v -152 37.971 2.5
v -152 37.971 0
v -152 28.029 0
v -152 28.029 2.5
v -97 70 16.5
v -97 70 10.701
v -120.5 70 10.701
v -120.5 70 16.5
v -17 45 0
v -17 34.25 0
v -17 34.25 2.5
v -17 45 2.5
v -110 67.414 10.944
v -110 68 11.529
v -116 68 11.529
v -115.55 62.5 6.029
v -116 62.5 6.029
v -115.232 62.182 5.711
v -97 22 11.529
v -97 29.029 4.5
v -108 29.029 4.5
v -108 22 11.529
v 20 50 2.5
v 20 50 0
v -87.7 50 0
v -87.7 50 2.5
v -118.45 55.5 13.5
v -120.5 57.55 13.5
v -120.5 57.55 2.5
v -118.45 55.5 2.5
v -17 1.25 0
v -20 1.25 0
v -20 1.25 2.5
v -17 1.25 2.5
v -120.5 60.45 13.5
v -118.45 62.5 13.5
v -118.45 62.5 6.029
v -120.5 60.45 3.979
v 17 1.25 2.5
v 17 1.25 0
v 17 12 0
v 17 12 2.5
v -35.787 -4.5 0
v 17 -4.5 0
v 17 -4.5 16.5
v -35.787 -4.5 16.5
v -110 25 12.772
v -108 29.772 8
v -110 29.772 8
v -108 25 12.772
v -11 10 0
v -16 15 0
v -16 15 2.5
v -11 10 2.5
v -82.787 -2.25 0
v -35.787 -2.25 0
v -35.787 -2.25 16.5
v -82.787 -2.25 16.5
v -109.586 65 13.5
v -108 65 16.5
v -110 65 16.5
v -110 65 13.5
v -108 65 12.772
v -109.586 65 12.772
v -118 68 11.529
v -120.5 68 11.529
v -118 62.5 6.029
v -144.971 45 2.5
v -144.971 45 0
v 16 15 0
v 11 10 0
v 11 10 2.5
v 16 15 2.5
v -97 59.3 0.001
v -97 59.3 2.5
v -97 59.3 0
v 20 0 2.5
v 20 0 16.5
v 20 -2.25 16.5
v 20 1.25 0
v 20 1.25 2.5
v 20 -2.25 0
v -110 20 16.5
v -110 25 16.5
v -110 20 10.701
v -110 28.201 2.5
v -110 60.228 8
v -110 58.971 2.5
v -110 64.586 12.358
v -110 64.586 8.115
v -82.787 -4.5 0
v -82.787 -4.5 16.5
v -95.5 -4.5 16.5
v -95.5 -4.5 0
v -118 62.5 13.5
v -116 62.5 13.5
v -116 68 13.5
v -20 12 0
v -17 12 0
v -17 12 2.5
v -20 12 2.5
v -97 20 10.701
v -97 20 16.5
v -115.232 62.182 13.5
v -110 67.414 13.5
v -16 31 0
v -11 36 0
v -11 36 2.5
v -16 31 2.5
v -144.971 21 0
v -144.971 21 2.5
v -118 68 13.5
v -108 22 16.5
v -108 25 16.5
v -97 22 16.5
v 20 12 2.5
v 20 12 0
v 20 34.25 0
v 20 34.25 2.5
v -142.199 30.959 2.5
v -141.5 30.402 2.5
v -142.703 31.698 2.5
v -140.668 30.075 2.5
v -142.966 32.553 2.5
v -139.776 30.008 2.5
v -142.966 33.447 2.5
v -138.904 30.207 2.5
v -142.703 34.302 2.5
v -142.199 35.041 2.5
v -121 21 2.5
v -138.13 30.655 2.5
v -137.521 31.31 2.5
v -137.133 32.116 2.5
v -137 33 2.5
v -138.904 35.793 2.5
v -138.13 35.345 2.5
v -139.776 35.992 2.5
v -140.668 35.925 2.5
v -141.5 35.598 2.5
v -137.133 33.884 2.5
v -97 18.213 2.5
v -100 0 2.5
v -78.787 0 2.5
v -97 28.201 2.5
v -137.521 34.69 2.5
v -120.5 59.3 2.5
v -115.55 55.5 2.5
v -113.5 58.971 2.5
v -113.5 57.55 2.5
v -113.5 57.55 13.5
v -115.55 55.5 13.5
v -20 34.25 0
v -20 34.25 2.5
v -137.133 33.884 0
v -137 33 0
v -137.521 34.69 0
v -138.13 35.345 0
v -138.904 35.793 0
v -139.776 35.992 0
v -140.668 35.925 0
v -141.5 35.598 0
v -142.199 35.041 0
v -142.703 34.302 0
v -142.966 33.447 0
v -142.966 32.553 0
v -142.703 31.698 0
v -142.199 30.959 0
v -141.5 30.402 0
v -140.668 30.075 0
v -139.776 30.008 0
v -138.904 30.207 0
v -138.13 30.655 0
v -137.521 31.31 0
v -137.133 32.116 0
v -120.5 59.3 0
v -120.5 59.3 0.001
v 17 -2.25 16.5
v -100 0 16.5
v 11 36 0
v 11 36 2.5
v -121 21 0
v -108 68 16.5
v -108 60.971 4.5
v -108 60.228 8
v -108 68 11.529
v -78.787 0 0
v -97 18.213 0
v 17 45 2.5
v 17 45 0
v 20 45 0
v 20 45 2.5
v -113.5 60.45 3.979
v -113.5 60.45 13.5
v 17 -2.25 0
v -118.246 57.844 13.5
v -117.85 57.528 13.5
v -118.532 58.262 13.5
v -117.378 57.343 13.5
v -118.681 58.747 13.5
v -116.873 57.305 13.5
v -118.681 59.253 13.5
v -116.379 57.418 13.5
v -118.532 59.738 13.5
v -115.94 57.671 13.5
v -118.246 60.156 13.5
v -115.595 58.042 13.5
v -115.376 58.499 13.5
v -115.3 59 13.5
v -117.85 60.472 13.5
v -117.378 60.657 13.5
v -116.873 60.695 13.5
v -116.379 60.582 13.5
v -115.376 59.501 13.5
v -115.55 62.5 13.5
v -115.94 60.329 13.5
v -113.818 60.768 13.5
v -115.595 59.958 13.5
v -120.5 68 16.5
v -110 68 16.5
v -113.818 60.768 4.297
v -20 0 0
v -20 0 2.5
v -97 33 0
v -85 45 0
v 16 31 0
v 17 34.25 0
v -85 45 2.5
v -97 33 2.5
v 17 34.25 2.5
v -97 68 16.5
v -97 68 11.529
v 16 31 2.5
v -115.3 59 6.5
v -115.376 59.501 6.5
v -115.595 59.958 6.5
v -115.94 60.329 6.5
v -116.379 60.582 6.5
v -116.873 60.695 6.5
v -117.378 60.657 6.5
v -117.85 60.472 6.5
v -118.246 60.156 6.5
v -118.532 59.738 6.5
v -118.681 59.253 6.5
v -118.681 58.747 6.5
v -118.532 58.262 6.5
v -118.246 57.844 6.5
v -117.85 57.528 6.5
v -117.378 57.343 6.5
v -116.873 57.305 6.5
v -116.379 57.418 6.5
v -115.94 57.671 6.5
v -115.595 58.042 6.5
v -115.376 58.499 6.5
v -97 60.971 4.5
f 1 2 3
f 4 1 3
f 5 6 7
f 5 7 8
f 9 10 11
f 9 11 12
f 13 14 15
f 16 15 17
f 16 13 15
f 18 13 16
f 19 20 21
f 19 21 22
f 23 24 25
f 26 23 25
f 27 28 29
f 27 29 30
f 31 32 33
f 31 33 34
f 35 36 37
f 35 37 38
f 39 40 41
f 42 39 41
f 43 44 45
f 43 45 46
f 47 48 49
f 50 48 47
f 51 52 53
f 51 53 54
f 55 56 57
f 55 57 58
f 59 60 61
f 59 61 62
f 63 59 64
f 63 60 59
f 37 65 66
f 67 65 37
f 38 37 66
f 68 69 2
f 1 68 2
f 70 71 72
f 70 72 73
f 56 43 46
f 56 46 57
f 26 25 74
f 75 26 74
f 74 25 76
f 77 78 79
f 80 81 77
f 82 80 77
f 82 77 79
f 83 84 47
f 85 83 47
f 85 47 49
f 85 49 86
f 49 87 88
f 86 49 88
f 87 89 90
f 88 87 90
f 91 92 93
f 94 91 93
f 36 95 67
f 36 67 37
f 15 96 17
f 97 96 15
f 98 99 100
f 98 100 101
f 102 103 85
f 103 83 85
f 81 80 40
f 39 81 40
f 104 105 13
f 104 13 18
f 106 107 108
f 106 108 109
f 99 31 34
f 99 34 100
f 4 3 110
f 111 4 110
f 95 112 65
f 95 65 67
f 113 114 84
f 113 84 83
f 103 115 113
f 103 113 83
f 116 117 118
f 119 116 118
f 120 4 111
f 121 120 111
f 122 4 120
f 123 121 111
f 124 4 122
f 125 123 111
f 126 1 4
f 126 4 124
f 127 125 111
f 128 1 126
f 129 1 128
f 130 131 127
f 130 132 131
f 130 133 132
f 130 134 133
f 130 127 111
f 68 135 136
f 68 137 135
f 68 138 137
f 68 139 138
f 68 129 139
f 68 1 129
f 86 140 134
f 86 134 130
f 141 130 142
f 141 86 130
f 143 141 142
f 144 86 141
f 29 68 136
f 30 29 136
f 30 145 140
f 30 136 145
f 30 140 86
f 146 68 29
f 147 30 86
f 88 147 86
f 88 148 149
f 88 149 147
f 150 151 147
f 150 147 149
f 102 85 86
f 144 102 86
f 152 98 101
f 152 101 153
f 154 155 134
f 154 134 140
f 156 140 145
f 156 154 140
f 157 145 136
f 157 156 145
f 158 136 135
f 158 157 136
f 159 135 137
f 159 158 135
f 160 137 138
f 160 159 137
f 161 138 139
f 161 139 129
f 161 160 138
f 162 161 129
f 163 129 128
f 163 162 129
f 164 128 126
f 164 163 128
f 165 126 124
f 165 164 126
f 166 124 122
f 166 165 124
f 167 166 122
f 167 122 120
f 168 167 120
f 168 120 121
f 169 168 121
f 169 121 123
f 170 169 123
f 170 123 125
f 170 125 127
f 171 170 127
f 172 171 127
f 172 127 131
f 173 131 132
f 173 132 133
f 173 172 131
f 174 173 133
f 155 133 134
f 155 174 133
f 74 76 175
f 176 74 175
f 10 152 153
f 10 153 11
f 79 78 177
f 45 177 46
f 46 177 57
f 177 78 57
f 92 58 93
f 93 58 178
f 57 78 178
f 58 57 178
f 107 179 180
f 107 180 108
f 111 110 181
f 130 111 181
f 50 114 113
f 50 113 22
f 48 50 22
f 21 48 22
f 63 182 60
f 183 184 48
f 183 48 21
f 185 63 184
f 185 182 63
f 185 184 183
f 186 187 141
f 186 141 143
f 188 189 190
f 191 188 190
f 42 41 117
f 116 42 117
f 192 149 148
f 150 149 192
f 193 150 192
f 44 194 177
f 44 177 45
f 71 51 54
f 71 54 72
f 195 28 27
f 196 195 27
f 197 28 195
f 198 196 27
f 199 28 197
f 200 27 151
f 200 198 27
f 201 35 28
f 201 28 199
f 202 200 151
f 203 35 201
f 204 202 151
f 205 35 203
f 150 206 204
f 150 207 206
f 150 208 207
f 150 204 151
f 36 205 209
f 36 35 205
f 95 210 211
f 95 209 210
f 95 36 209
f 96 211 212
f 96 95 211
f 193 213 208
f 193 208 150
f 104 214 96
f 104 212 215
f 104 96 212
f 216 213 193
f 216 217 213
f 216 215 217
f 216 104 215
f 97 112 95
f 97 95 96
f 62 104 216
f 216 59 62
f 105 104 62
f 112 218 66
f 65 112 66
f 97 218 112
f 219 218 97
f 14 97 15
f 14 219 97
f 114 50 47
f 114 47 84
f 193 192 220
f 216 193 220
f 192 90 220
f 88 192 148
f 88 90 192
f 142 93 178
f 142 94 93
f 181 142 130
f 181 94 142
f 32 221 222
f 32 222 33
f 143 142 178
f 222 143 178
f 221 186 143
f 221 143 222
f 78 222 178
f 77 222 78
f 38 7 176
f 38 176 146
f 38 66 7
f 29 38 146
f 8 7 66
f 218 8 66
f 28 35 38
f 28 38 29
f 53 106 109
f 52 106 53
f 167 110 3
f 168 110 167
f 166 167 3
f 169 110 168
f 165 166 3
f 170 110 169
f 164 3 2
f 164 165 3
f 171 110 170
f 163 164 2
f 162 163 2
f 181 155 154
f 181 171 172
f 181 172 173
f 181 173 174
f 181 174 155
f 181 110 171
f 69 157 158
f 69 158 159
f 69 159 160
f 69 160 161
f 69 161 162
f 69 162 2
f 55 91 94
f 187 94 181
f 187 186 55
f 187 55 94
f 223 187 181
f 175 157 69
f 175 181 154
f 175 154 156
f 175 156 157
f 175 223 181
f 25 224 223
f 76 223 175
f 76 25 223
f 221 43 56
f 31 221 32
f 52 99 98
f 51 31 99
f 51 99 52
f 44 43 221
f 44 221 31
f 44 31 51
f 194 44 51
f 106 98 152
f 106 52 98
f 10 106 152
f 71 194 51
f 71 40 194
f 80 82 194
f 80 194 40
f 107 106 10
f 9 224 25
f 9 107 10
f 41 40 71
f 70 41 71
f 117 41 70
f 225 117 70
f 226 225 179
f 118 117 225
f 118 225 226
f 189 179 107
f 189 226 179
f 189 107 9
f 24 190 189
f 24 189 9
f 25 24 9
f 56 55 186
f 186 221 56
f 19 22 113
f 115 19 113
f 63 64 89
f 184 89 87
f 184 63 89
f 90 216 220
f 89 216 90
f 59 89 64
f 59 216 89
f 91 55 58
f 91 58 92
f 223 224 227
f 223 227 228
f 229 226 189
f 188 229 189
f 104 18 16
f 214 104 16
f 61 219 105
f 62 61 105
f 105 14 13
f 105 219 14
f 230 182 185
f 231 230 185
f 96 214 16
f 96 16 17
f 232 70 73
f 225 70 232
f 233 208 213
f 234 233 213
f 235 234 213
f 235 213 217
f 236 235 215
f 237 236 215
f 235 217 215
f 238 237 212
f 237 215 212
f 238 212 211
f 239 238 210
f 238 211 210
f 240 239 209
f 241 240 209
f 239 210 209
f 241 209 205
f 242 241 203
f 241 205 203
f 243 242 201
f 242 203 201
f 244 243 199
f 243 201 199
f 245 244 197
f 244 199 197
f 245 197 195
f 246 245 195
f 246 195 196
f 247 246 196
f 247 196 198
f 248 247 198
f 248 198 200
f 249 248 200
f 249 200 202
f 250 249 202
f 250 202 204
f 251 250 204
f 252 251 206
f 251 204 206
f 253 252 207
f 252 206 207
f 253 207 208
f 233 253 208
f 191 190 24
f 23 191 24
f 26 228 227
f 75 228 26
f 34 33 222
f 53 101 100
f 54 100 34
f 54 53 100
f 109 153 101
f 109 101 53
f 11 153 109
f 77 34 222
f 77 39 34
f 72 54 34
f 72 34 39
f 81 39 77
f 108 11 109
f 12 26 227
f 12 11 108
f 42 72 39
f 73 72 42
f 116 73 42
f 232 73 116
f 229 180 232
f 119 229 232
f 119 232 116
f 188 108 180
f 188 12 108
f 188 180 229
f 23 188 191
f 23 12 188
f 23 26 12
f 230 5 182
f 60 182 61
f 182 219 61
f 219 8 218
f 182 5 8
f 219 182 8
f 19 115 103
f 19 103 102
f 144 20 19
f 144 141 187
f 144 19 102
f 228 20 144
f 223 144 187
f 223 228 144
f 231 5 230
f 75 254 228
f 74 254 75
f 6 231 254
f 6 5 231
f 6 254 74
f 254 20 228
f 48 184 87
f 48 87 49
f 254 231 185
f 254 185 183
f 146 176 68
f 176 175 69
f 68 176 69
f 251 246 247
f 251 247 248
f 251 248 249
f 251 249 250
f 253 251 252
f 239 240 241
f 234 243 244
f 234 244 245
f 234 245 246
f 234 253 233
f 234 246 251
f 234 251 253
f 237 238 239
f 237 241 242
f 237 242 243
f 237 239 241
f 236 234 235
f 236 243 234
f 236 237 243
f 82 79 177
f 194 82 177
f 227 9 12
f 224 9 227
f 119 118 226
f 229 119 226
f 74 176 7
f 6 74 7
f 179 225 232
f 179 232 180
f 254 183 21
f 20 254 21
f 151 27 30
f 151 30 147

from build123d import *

# Parameters (mm, degrees)
SKETCH4_R            = 3
MAIN_WALL_DEPTH      = 2.5
BASE_DEPTH           = 14
BOSS_EXTRUDE8_DEPTH  = 2
BOSS_EXTRUDE9_DEPTH  = 11
BOSS_EXTRUDE15_DEPTH = 12.5
BOSS_EXTRUDE13_REACH = 169.888
SKETCH19_R           = 1.7
CUT_EXTRUDE1_DEPTH   = 7


with BuildPart() as part:
    # Sketch4 → Main Wall (new body)
    with BuildSketch(Plane.XY):
        Polygon((-97, 59.3), (-113.5, 59.3), (-120.5, 59.3), (-144.970562748, 45), (-152, 37.970562748), (-152, 28.029437252), (-144.970562748, 21), (-135.029437252, 21), (-121, 21), (-95.5, -4.5), (-82.786796564, -4.5), (-82.786796564, -2.25), (-35.786796564, -2.25), (-35.786796564, -4.5), (17, -4.5), (17, -2.25), (20, -2.25), (20, 1.25), (17, 1.25), (17, 12), (20, 12), (20, 34.25), (17, 34.25), (17, 45), (20, 45), (20, 50), (-87.7, 50), align=None)
        with Locations((-140, 33)):
            Circle(SKETCH4_R, mode=Mode.SUBTRACT)
        Polygon((-20, 0), (-20, 1.25), (-17, 1.25), (-17, 12), (-20, 12), (-20, 34.25), (-17, 34.25), (-17, 45), (-85, 45), (-97, 33), (-97, 18.213203436), (-78.786796564, 0), align=None, mode=Mode.SUBTRACT)
        Polygon((11, 36), (-11, 36), (-16, 31), (-16, 15), (-11, 10), (11, 10), (16, 15), (16, 31), align=None, mode=Mode.SUBTRACT)
    extrude(amount=MAIN_WALL_DEPTH)

    # Sketch5 → Base (add)
    with BuildSketch(Plane.XY.offset(2.5)):
        Polygon((20, 0), (20, -2.25), (17, -2.25), (17, -4.5), (-35.786796564, -4.5), (-35.786796564, -2.25), (-82.786796564, -2.25), (-82.786796564, -4.5), (-95.5, -4.5), (-100, 0), align=None)
    extrude(amount=BASE_DEPTH)

    # Sketch15 → Boss-Extrude8 (add)
    with BuildSketch(Plane(origin=(-108, 0, 0), x_dir=(0, 0, -1), z_dir=(1, 0, 0))):
        Polygon((0, 30.701010127), (0, 59.298989873), (-10.701010127, 70), (-16.5, 70), (-16.5, 68), (-16.5, 65), (-12.772077939, 65), (-8, 60.227922061), (-8, 29.772077939), (-12.772077939, 25), (-16.5, 25), (-16.5, 20), (-10.701010127, 20), align=None)
    extrude(amount=-BOSS_EXTRUDE8_DEPTH)

    # Sketch16 → Boss-Extrude9 (add)
    with BuildSketch(Plane(origin=(-108, 0, 0), x_dir=(0, 0, -1), z_dir=(1, 0, 0))):
        Polygon((-16.5, 68), (-11.529437252, 68), (-4.5, 60.970562748), (-4.5, 29.029437252), (-11.529437252, 22), (-16.5, 22), (-16.5, 20), (-10.701010127, 20), (0, 30.701010127), (0, 59.298989873), (-10.701010127, 70), (-16.5, 70), align=None)
    extrude(amount=BOSS_EXTRUDE9_DEPTH)

    # Sketch17 → Boss-Extrude15 (add)
    with BuildSketch(Plane(origin=(-108, 0, 0), x_dir=(0, 0, -1), z_dir=(1, 0, 0))):
        Polygon((0, 59.298989873), (-10.701010127, 70), (-16.5, 70), (-16.5, 68), (-11.529437252, 68), (-2.5, 58.970562748), (-2.5, 50), (0, 50), align=None)
    extrude(amount=-BOSS_EXTRUDE15_DEPTH)

    # Sketch18 → Boss-Extrude13 (add, up to next)
    with BuildSketch(Plane.XY.offset(13.5), mode=Mode.PRIVATE) as boss_extrude13_sk1:
        Polygon((-115.550252532, 62.5), (-116, 62.5), (-116, 69.5), (-118, 69.5), (-118, 62.5), (-118.449747468, 62.5), (-120.5, 60.449747468), (-120.5, 57.550252532), (-118.449747468, 55.5), (-115.550252532, 55.5), (-113.5, 57.550252532), (-113.5, 60.449747468), (-113.818019485, 60.767766953), (-108.161165235, 66.424621202), (-109.575378798, 67.838834765), (-115.232233047, 62.181980515), align=None)
    boss_extrude13_tool1 = extrude(boss_extrude13_sk1.sketch, amount=-BOSS_EXTRUDE13_REACH, mode=Mode.PRIVATE) - part.part
    add(boss_extrude13_tool1.solids().sort_by_distance((-115.797998, 61.590243, 13.5))[0])

    # Sketch19 → Cut-Extrude1 (cut)
    with BuildSketch(Plane.XY.offset(13.5)):
        with Locations((-117, 59)):
            Circle(SKETCH19_R)
    extrude(amount=-CUT_EXTRUDE1_DEPTH, mode=Mode.SUBTRACT)


solid = part.part
